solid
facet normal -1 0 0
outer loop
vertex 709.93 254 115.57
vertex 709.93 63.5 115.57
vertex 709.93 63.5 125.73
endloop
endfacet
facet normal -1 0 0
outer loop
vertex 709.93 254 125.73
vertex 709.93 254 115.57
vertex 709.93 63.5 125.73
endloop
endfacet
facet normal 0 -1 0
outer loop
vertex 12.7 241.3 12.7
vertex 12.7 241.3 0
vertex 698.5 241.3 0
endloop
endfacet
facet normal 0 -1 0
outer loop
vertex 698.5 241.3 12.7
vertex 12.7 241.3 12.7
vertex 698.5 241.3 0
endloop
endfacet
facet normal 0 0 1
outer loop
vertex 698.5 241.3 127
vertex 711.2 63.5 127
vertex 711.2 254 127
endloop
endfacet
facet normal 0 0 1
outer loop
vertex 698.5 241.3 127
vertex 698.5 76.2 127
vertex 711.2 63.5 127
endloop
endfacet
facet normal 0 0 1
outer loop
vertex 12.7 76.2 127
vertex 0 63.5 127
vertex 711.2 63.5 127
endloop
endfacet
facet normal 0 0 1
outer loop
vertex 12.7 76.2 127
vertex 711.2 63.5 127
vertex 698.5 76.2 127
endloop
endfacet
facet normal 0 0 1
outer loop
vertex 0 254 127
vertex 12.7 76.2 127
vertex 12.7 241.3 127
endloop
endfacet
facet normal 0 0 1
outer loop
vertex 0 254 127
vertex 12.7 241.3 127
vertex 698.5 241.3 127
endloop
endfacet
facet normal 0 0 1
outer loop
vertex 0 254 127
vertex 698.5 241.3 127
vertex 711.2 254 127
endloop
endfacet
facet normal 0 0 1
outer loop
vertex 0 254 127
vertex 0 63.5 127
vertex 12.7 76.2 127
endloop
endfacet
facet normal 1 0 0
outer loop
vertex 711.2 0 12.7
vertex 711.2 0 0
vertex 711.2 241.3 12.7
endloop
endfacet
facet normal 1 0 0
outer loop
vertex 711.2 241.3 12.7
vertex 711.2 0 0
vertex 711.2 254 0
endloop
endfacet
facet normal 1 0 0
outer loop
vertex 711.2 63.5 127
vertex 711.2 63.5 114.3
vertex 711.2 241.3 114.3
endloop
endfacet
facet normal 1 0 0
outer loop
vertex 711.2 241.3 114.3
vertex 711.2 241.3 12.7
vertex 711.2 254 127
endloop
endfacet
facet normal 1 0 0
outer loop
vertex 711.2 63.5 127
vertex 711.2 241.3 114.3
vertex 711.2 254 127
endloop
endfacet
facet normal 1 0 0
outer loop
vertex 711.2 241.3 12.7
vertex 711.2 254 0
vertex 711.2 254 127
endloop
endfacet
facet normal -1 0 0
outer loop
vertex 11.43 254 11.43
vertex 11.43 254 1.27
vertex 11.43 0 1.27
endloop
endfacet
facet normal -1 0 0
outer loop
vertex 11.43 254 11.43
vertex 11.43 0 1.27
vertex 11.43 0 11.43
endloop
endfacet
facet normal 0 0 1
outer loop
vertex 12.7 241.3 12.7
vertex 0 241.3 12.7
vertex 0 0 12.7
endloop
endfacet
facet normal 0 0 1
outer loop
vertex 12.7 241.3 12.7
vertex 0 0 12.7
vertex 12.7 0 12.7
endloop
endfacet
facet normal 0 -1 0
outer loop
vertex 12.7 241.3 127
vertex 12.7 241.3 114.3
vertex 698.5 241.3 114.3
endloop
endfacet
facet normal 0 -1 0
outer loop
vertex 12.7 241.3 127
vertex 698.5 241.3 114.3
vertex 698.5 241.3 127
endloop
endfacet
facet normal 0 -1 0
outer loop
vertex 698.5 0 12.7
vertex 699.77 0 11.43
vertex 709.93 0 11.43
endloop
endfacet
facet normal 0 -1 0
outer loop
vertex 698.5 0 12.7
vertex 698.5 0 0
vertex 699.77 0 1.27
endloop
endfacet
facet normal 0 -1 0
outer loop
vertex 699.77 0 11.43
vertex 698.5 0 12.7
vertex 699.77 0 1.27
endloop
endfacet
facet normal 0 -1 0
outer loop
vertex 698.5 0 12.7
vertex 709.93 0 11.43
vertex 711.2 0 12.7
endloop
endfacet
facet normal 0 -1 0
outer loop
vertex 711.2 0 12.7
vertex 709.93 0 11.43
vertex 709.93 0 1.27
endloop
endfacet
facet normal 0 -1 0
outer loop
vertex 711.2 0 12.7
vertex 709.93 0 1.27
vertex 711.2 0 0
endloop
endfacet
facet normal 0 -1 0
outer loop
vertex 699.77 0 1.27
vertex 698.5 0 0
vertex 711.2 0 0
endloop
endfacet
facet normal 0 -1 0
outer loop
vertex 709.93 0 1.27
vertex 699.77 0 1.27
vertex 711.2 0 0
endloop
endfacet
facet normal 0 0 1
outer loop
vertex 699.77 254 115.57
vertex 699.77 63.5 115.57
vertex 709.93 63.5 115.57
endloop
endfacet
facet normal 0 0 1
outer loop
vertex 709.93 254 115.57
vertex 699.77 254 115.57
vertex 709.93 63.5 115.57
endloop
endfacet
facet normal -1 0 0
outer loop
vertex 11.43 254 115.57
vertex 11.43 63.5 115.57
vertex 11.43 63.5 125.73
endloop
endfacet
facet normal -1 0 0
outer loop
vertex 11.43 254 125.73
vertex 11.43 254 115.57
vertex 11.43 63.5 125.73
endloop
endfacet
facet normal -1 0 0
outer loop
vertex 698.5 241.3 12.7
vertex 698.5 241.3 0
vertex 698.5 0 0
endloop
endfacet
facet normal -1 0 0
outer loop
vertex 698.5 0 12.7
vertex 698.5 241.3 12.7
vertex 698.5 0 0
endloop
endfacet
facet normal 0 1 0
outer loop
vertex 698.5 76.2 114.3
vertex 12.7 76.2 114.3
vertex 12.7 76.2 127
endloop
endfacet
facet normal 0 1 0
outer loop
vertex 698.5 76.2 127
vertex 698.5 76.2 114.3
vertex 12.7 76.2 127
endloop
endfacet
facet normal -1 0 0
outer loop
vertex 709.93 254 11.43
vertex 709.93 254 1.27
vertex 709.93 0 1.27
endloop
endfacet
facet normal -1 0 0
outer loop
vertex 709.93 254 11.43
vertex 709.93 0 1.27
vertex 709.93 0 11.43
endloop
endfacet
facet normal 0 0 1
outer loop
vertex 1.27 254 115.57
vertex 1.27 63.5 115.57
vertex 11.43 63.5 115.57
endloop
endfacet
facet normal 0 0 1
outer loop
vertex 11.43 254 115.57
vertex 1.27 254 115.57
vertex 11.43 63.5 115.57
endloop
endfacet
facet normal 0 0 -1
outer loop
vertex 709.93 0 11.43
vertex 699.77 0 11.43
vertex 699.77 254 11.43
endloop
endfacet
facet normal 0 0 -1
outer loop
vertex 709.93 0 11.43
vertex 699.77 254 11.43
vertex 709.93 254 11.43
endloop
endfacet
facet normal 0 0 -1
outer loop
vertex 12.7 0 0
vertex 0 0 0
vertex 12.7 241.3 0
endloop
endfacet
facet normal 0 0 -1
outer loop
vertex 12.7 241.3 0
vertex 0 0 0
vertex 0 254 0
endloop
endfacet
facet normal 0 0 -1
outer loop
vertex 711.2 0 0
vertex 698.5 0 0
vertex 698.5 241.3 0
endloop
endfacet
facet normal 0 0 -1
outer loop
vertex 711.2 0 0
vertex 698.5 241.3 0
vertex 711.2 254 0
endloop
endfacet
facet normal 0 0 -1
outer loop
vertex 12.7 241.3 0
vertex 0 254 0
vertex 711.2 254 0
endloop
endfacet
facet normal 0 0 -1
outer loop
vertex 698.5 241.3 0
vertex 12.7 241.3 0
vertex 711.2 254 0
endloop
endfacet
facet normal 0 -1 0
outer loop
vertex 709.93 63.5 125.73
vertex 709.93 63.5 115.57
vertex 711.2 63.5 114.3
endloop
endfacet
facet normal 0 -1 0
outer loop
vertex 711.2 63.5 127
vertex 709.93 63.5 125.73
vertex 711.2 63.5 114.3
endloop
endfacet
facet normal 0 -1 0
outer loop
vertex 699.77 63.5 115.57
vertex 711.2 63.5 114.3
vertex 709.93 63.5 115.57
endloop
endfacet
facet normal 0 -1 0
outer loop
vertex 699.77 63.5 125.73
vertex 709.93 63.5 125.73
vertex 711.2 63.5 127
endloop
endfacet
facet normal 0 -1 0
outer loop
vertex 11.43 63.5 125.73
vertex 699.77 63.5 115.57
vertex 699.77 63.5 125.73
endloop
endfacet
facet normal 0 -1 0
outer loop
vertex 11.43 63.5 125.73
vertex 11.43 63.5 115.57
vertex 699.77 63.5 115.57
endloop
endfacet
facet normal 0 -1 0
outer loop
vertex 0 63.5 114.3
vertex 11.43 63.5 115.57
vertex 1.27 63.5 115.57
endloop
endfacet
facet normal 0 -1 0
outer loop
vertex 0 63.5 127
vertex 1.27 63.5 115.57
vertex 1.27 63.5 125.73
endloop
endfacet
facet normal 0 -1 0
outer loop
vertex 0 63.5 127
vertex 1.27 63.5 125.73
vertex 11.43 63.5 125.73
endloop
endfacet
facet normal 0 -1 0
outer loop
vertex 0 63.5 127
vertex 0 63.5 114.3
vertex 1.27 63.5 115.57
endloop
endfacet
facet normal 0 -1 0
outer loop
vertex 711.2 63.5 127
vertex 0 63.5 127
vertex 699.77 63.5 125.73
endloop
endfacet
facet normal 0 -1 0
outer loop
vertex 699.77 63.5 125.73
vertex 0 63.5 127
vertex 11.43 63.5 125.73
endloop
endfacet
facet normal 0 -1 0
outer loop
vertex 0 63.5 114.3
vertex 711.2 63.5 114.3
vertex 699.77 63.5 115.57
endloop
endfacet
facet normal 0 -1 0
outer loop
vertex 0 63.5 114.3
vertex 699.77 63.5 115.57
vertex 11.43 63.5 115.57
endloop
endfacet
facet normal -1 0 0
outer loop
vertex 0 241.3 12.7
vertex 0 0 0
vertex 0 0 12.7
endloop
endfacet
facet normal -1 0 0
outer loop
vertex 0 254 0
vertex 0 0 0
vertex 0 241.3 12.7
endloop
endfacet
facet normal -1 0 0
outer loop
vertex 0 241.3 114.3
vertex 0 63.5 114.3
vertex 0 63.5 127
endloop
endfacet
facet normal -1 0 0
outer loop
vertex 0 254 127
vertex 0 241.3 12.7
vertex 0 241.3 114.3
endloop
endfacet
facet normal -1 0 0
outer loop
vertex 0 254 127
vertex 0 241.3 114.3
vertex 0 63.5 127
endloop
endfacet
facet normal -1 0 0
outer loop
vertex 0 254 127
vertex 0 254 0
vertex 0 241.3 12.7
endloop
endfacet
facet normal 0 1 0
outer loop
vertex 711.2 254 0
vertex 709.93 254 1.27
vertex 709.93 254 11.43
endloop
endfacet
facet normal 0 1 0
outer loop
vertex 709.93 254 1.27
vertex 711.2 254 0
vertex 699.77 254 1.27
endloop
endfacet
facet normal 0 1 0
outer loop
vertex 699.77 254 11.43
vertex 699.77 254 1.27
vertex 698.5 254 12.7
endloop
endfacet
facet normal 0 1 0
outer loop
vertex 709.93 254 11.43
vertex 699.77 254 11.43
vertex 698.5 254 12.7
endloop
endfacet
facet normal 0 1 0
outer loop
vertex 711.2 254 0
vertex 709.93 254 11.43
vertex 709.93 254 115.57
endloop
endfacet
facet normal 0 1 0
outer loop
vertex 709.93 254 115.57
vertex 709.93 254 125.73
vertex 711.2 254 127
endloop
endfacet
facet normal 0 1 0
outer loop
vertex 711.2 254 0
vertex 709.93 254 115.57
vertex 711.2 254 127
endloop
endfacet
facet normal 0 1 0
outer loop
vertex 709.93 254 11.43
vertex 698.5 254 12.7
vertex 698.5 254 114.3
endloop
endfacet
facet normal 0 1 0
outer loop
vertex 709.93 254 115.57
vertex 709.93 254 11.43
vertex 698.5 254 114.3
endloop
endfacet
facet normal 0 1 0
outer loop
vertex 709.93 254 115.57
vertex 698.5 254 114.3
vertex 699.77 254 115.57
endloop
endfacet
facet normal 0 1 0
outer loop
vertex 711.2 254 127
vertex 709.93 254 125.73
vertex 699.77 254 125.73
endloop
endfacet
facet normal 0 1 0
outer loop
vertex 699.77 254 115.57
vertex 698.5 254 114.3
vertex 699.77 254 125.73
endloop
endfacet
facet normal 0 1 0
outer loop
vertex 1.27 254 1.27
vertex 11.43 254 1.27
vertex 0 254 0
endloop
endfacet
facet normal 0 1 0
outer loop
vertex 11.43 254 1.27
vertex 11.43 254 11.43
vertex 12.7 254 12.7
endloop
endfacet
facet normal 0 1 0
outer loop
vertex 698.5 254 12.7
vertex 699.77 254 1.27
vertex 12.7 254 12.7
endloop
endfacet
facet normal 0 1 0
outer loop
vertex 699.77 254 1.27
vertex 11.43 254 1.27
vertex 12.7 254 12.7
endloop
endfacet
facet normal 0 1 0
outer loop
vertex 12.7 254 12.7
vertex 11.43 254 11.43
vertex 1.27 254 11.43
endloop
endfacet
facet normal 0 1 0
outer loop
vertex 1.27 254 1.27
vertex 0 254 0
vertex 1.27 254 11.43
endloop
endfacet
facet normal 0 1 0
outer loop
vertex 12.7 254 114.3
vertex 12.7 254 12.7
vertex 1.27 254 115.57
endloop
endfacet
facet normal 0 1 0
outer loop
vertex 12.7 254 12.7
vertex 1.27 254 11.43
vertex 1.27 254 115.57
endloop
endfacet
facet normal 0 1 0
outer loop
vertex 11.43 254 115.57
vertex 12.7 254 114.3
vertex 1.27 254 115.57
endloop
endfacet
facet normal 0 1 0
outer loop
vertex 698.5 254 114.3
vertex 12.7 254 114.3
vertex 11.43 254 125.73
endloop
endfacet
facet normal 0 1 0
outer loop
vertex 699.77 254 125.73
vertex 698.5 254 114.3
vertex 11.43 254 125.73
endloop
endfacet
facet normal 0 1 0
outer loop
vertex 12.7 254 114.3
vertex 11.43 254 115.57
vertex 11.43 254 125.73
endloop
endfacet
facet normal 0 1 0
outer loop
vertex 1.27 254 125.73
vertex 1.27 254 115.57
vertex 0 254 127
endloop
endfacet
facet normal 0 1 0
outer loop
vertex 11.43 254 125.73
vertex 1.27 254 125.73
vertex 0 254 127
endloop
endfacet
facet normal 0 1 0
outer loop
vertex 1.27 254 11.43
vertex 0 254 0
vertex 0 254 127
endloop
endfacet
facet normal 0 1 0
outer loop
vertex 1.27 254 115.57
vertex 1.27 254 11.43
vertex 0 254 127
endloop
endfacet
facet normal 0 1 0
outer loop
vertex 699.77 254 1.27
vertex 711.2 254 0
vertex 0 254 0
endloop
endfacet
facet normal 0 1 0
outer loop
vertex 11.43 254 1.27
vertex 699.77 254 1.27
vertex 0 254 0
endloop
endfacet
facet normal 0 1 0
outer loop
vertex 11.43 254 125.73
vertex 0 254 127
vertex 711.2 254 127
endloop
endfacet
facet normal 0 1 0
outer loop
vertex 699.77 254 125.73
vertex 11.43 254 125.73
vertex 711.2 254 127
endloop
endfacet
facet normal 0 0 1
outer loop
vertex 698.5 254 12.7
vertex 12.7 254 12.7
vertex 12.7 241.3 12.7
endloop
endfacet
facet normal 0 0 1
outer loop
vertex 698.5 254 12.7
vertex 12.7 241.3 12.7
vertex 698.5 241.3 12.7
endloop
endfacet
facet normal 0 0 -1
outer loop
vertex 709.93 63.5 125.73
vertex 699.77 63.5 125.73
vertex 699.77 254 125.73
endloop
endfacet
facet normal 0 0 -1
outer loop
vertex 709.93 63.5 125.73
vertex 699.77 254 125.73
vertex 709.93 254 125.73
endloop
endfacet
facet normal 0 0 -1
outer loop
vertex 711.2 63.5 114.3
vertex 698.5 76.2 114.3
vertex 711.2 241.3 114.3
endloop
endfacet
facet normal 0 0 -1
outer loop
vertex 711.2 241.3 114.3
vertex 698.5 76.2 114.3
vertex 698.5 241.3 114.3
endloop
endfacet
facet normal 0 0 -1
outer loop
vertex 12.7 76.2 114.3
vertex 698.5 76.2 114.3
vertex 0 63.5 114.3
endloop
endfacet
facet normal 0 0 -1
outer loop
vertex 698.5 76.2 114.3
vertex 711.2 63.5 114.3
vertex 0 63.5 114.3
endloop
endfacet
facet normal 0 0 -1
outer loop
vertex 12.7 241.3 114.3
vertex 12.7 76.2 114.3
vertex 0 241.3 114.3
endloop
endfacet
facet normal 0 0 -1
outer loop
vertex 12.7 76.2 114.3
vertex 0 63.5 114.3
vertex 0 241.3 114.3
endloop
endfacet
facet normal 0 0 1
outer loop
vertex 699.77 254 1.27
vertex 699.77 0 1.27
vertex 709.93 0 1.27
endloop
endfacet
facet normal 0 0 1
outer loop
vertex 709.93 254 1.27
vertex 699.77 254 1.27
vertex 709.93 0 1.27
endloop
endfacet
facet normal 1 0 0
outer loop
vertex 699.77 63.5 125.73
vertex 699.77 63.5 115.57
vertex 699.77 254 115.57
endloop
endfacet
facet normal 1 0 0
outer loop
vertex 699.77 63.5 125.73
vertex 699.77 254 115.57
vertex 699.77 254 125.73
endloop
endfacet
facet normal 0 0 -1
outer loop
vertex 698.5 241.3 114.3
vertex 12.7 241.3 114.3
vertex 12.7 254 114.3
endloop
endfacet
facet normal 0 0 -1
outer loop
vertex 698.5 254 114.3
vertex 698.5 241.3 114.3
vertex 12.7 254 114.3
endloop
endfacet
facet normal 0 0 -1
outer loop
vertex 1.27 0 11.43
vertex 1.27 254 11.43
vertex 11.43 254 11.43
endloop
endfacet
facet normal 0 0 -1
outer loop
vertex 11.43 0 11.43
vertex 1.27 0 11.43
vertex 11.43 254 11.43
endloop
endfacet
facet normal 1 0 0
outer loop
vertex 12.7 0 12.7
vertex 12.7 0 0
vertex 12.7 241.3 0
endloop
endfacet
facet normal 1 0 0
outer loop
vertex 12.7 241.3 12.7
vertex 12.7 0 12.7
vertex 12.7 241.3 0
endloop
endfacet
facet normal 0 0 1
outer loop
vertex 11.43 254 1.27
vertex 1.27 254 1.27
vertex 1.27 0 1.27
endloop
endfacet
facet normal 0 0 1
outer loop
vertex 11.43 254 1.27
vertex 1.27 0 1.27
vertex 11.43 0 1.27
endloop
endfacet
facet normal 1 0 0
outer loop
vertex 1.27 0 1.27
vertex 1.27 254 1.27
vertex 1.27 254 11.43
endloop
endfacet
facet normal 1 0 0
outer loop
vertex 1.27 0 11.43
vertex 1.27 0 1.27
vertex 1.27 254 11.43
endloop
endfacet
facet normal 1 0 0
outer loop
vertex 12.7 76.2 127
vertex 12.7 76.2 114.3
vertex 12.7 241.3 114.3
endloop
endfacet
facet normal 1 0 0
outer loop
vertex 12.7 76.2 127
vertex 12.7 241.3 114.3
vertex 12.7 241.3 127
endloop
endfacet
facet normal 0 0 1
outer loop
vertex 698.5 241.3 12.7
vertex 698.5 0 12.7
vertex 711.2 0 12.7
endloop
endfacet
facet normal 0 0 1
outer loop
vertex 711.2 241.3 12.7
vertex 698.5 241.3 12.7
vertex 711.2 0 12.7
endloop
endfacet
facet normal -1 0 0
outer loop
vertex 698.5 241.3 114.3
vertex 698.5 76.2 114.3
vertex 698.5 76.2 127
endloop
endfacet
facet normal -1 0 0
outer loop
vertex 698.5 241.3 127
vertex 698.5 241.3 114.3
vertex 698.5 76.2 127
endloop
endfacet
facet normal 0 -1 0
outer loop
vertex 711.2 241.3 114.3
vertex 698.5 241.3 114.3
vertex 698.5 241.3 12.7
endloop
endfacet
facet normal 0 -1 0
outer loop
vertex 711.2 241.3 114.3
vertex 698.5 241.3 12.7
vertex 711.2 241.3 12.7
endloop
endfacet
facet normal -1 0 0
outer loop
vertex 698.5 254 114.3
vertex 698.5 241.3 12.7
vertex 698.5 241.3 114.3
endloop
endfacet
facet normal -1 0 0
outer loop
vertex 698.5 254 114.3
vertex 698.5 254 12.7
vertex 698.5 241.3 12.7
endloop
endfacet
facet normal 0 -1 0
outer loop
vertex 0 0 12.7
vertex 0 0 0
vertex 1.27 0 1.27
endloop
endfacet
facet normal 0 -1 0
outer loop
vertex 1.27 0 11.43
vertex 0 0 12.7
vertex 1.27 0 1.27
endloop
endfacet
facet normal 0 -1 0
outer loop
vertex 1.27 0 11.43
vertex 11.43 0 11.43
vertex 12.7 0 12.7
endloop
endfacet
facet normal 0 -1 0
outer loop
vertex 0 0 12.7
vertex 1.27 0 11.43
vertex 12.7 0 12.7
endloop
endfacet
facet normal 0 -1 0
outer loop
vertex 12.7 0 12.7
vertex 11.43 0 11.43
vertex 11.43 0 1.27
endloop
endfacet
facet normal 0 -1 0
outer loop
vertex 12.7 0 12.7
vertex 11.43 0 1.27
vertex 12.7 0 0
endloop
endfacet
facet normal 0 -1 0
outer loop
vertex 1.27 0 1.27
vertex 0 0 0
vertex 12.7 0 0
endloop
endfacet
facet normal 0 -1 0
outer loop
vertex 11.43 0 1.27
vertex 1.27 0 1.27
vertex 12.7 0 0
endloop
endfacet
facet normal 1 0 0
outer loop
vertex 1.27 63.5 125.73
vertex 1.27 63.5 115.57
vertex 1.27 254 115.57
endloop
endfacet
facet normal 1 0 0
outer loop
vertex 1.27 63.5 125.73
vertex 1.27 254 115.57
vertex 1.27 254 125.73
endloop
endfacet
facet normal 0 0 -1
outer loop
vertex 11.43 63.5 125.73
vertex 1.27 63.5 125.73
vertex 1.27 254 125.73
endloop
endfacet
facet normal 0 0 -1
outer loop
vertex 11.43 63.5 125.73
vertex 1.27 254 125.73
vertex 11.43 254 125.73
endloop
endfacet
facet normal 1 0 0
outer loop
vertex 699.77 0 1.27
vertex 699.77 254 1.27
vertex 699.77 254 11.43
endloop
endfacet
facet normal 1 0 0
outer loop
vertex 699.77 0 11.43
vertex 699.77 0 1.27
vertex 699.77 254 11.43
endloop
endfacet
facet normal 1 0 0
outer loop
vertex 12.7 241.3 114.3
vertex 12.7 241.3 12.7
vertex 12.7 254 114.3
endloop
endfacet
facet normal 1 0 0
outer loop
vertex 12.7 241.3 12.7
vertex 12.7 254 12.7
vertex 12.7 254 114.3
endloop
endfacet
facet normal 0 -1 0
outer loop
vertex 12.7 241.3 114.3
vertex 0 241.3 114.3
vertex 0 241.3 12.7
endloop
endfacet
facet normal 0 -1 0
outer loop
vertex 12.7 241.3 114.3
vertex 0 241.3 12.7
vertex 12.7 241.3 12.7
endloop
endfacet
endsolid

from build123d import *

# Parameters (mm, degrees)
F1_DEPTH  = 12.7
F2_W      = 12.7
F2_H      = 12.7
F3_DEPTH  = 114.3
F4_W      = 12.7
F4_H      = 12.7
F5_DEPTH  = 177.8
F6_W      = 12.7
F6_H      = 12.7
F7_DEPTH  = 177.8
F8_W      = 12.7
F8_H      = 12.7
F9_DEPTH  = 685.8
F10_W     = 12.7
F10_H     = 12.7
F11_DEPTH = 685.8
F12_W     = 10.16
F12_H     = 10.16
F13_DEPTH = 254.001
F14_W     = 10.16
F14_H     = 10.16
F15_DEPTH = 190.501
F16_W     = 10.16
F16_H     = 10.16
F17_DEPTH = 254.001


with BuildPart() as f1:
    # F0 (on Top) → F1 (new body)
    with BuildSketch(Plane.XY):
        Polygon((0, 254), (0, 0), (12.7, 0), (12.7, 241.3), (698.5, 241.3), (698.5, 0), (711.2, 0), (711.2, 254), align=None)
    extrude(amount=F1_DEPTH)

    # F2 (on face) → F3 (join)
    with BuildSketch(Plane.XY.offset(12.7)):
        with Locations((6.35, 247.65)):
            Rectangle(F2_W, F2_H)
        with Locations((704.85, 247.65)):
            Rectangle(F2_W, F2_H)
    extrude(amount=F3_DEPTH)

    # F4 (on face) → F5 (join)
    with BuildSketch(Plane.XZ.offset(-241.3)):
        with Locations((6.35, 120.65)):
            Rectangle(F4_W, F4_H)
    extrude(amount=F5_DEPTH)

    # F6 (on face) → F7 (join)
    with BuildSketch(Plane.XZ.offset(-241.3)):
        with Locations((704.85, 120.65)):
            Rectangle(F6_W, F6_H)
    extrude(amount=F7_DEPTH)

    # F8 (on face) → F9 (join, through all)
    with BuildSketch(Plane.YZ.offset(12.7)):
        with Locations((247.65, 120.65)):
            Rectangle(F8_W, F8_H)
    extrude(amount=F9_DEPTH)

    # F10 (on face) → F11 (join, through all)
    with BuildSketch(Plane.YZ.offset(12.7)):
        with Locations((69.85, 120.65)):
            Rectangle(F10_W, F10_H)
    extrude(amount=F11_DEPTH)

    # F12 (on face) → F13 (cut, through all)
    with BuildSketch(Plane.XZ):
        with Locations((704.85, 6.35)):
            Rectangle(F12_W, F12_H)
    extrude(amount=-F13_DEPTH, mode=Mode.SUBTRACT)

    # F14 (on face) → F15 (cut, through all)
    with BuildSketch(Plane.XZ.offset(-63.5)):
        with Locations((704.85, 120.65)):
            Rectangle(F14_W, F14_H)
        with Locations((6.35, 120.65)):
            Rectangle(F14_W, F14_H)
    extrude(amount=-F15_DEPTH, mode=Mode.SUBTRACT)

    # F16 (on face) → F17 (cut, through all)
    with BuildSketch(Plane.XZ):
        with Locations((6.35, 6.35)):
            Rectangle(F16_W, F16_H)
    extrude(amount=-F17_DEPTH, mode=Mode.SUBTRACT)


solid = f1.part
